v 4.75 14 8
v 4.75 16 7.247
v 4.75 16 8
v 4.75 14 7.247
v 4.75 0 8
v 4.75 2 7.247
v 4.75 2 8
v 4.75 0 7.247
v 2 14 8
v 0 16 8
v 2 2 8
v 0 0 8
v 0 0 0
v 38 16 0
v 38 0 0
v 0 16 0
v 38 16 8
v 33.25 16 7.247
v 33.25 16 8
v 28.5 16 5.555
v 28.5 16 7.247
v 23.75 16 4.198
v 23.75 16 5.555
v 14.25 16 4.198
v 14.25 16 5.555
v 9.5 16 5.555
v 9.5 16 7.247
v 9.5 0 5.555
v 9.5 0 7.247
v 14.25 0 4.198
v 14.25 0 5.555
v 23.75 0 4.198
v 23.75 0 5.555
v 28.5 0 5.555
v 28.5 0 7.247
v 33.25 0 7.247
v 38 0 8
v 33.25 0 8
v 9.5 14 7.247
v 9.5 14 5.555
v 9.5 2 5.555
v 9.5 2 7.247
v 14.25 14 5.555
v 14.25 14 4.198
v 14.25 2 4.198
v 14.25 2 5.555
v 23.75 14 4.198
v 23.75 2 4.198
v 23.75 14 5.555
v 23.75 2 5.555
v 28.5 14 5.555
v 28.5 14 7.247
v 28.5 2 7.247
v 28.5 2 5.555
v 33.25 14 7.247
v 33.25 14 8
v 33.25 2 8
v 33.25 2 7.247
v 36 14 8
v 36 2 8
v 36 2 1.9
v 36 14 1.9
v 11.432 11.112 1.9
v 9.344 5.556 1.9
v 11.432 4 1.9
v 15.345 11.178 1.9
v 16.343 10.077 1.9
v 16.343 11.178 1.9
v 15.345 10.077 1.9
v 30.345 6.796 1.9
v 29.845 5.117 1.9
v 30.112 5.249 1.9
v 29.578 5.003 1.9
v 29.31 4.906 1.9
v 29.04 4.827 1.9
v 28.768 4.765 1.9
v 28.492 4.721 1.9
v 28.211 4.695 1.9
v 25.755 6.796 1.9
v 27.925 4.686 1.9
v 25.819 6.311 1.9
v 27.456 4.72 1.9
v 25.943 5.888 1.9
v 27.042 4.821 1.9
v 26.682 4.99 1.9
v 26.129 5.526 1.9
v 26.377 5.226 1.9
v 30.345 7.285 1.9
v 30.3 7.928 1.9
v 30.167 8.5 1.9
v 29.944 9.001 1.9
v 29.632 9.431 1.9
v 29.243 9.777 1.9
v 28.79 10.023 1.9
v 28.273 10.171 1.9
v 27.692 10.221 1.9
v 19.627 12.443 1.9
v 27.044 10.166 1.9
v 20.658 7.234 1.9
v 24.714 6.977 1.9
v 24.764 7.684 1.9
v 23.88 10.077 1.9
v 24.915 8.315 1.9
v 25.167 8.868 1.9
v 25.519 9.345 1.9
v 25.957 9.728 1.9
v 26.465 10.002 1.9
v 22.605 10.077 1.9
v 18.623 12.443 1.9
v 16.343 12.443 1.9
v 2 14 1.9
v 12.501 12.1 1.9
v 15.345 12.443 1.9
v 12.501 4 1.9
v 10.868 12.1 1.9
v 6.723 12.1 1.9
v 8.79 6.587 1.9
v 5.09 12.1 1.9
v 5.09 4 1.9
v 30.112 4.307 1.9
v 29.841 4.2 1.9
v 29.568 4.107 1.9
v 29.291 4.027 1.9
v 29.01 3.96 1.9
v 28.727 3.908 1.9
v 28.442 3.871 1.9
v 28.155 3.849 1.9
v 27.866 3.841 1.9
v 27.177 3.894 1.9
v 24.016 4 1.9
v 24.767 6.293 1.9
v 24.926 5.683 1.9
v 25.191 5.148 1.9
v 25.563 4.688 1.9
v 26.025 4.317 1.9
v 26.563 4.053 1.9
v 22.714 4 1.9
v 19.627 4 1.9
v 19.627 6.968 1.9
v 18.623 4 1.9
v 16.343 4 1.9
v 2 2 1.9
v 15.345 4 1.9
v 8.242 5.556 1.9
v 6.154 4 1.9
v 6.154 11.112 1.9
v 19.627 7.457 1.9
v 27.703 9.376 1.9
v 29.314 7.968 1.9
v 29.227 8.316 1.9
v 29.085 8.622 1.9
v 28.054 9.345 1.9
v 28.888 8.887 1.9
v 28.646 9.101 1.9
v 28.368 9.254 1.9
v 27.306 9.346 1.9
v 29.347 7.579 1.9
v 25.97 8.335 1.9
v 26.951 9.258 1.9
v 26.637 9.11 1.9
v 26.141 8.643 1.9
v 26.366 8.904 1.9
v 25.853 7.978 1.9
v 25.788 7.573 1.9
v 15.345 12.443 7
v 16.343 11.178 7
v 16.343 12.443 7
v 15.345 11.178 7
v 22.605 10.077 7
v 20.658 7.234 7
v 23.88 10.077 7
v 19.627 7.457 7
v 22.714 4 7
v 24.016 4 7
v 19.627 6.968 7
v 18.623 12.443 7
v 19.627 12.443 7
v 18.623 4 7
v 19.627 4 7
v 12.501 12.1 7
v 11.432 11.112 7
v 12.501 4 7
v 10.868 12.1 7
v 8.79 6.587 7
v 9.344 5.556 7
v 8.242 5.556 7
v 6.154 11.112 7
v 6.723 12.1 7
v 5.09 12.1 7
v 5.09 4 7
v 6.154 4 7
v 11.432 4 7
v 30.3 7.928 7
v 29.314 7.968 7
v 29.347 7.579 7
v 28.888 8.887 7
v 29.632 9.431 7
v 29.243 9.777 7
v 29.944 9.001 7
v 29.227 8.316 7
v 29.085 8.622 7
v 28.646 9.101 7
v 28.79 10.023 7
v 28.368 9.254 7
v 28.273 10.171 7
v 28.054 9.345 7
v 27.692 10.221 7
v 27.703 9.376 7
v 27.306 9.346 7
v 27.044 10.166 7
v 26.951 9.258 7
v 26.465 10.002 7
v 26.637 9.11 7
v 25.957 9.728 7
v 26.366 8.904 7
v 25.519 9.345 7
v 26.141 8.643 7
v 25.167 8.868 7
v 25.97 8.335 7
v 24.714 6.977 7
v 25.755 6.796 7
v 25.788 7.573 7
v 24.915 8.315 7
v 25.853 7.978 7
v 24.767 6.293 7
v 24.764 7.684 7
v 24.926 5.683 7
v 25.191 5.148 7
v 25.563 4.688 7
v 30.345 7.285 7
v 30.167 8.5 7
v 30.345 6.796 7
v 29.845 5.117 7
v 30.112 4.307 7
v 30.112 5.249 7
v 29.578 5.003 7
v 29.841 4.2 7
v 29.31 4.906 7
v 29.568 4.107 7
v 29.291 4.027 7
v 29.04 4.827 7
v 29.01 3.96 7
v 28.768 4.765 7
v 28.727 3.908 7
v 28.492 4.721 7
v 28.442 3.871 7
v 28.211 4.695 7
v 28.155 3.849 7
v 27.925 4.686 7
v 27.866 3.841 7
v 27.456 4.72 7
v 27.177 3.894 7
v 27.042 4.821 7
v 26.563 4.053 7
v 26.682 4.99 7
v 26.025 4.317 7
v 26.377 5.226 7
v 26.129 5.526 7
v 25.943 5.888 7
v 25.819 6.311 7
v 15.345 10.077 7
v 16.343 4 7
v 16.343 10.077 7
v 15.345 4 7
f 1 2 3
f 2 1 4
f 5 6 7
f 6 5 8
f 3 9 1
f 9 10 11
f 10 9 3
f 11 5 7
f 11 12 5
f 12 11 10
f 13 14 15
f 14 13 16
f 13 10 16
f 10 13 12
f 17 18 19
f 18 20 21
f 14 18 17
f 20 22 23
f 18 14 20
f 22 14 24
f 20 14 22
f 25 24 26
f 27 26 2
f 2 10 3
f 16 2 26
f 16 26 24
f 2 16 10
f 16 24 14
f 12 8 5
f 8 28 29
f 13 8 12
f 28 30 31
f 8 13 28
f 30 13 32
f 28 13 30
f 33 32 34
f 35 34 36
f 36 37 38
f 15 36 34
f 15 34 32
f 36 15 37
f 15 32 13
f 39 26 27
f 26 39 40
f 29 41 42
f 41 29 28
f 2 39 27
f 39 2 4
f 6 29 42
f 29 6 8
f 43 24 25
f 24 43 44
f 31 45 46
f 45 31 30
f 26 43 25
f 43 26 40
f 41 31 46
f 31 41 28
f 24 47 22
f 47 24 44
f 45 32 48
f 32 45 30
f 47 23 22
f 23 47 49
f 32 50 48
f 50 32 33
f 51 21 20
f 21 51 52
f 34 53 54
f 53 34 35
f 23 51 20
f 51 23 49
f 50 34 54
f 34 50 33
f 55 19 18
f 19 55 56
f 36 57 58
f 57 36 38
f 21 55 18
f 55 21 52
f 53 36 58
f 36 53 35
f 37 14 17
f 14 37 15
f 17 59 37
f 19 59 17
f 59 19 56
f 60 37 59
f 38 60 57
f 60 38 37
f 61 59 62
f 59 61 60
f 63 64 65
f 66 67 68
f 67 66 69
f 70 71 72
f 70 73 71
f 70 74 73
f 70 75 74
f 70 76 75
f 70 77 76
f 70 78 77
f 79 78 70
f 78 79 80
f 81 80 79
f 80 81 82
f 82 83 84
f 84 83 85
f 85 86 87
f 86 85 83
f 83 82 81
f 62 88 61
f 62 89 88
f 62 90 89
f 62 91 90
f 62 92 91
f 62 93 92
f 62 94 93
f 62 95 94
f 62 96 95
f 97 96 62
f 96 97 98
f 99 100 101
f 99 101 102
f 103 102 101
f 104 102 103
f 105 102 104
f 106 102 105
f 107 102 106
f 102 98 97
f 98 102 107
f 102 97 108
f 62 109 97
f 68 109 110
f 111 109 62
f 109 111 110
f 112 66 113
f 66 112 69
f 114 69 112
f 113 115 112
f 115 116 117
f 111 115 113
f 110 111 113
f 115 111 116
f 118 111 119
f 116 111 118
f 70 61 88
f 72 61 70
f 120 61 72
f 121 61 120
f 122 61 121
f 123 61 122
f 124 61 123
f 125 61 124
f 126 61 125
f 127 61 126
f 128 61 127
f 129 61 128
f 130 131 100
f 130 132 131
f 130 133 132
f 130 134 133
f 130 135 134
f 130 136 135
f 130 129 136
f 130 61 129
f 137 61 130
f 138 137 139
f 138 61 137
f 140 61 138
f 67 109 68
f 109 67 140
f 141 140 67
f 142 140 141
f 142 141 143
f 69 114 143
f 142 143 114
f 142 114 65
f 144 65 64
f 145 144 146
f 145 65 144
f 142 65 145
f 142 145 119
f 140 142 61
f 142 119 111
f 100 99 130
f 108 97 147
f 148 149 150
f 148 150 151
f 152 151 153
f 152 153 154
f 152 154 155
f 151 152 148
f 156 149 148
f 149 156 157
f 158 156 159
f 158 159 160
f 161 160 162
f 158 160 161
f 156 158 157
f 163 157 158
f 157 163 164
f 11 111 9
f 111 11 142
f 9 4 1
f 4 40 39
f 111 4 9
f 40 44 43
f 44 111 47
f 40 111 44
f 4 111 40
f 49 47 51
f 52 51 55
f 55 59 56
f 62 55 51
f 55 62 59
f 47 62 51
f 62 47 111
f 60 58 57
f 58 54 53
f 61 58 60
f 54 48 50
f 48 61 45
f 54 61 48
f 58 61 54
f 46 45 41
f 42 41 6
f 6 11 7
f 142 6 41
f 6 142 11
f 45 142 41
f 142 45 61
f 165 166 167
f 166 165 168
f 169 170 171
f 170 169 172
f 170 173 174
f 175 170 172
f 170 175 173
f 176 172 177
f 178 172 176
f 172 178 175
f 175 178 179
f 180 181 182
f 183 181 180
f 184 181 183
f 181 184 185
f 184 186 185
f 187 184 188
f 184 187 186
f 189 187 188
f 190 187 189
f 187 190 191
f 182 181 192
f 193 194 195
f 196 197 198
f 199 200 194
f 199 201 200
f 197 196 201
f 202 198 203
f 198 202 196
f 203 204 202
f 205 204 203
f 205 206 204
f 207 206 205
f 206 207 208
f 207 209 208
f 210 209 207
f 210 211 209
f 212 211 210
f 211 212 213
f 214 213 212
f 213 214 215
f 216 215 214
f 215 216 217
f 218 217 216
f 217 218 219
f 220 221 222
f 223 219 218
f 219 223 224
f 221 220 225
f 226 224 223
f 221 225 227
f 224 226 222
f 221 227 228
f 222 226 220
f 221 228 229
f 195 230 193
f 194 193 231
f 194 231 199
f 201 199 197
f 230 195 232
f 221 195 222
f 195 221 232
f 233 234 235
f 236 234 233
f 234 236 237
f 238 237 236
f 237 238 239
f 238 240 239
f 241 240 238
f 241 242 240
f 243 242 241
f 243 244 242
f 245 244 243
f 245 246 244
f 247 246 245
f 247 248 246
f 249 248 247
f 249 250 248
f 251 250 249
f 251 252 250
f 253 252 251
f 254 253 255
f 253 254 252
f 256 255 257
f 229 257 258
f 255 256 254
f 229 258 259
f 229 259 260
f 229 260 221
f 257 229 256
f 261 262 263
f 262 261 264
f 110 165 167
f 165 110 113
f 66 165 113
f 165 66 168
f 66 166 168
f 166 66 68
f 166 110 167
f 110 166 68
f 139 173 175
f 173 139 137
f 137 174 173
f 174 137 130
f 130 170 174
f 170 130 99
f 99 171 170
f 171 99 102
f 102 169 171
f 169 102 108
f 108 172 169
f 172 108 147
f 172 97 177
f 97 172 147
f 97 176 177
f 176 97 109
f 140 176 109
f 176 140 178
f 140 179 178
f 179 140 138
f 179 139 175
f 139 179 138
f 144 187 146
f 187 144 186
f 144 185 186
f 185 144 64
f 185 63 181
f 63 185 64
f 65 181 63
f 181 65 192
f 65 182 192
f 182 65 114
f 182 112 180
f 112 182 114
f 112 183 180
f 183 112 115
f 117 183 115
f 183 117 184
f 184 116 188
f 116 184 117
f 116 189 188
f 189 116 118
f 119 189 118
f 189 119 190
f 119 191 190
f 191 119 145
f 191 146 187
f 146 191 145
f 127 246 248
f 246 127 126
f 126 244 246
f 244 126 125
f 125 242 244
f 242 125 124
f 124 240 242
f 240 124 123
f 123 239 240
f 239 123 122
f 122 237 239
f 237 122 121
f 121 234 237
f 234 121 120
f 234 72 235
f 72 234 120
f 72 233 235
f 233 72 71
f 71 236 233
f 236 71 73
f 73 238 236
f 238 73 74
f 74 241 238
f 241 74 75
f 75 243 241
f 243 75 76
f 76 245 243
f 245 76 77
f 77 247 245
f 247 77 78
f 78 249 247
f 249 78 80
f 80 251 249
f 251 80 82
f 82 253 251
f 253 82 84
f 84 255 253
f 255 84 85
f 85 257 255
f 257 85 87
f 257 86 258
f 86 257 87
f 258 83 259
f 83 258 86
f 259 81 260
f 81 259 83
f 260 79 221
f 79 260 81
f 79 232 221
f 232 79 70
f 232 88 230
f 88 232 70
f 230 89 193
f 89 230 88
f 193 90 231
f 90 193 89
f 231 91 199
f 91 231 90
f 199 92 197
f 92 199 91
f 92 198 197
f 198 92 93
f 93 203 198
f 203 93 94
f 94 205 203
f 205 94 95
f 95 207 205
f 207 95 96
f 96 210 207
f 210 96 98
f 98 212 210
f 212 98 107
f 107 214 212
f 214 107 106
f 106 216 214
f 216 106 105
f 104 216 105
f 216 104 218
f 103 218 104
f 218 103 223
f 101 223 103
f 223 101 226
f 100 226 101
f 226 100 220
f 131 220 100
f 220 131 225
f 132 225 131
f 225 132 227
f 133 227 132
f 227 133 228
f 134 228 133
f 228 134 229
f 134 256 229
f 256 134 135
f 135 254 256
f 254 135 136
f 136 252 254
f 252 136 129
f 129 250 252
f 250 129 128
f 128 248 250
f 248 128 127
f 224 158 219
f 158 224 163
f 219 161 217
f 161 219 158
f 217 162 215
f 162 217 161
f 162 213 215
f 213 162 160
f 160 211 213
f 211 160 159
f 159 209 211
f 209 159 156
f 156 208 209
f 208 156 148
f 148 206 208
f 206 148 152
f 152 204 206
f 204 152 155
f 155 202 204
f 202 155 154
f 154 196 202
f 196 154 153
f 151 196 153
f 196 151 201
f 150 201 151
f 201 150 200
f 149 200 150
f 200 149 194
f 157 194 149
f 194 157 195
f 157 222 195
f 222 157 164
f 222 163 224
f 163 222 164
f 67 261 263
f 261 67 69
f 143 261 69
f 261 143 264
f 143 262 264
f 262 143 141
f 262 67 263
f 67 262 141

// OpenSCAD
// MakerBot Handbook Tutorial
// OpenSCAD nametag with parameters
// Modified for Customizer

/////////////////////////////////////////////////////////////////////
// THE PARAMETERS

// preview[view:south, tilt:top]

/* [Text] */

myword = "Mike";
myfont="Black Ops One"; //[Alfa Slab One,Anton,Architects Daughter,Bangers,Black Ops One,Bubblegum Sans,Cherry Cream Soda,Courgette,Damion,Droid Serif,Electrolize,Exo,Fjalla One,Fredoka One,Great Vibes,Josefin Slab,Julius Sans One,Lobster,Luckiest Guy,Marck Script,Montserrat,Nunito,Orbitron,Oswald, Oxygen,Pacifico,Patua One,Passion One,Paytone One,Permanent Marker,Poiret One,Press Start 2P,Quicksand,Righteous,Rock Salt,Rokkitt,Russo One,Satisfy,Shadows Into Light,Sigmar One,Signika,Syncopate,Walter Turncoat]

// size of the letters
fontsize = 8;

// amount the word is extruded
textheight = 7;

// space between characters
myspacing = 1.1;

/* [Dimensions] */

// left to right
length = 38; 

// top to bottom
width = 16;

// to the top of the tallest wave
height = 8;

/* [Wave] */

// number of waves
frequency = 1;

// low is stair-steppy, high is smoother
steps = 8;

// width of the wave border
border = 2;

// distance from border to text
inset = 2;

// thickness of base
base = 2;

/////////////////////////////////////////////////////////////////////
// PRINT THE TEXT

// STEP 3. Translate up and to the right past the border.

translate([ border + inset, border + inset, 0 ]){

    // STEP 2. Pull up the text in the z-direction.
    
    linear_extrude( height = textheight ){
    
        // STEP 1. Write the word in the correct font and size.
        
        text(
            text = myword, 
            font = myfont, 
            size = fontsize, 
            spacing = myspacing
        );
        
    // This closes the parenthesis for "linear_extrude".
    }

// This closes the parenthesis for "translate".  
}

/////////////////////////////////////////////////////////////////////
// THIS TRIGONOMETRIC FUNCTION CONTROLS THE WAVE
// (don't mess with this unless you are a trigonometry master :)

// The first part ensures that the lowest part is above the base.
// The middle part scales the function to a max height of "height".
// The last line is a shifted trig function with variable frequency.
// The "steps-1" allows one extra step contained in the "width".

function f(x) = 
    2*base + 
    0.5*(height - 2*base)*
    ( cos(frequency*x*360/(steps-1)) + 1 );
    
/////////////////////////////////////////////////////////////////////
// MAKE A WAVY SHAPE AND CUT OUT THE INSIDE

// The "difference" command subtracts the second thing from the first.
// We're going to construct a wavy shape and subtract an interior box.

difference(){
    
    // STEP 1: Make a wavy shape out of a series of retangular boxes.
    
    // Make a rectangular box for each number i = 0, 1, ..., steps-1.
    // To get a better idea of what each step is doing,
    // try replacing "steps-1" with something small like "4" or "8".
    // Then make sure it says "[0:steps-1]" again when you're done!
    
    for( i = [0:steps-1] ){
        
        // Move box "i" to the right by "i*(length/steps)" units,
        // so that box "i" begins right where box "i-1" ends.
        // Note that the width of each box is "length/steps".
        
        translate([ i*(length/steps), 0, 0 ])
            
            // This is box "i", a thin rectangular solid.
            // The box height is determined by the function "f".
            // Put a "#" before "cube" to see the full rectangles,
            // and remove it when you're done.
        
            cube([ length/steps, width, f(i) ]);
        
    // This closes the parentheses of the "for" loop.
    }
    
    // STEP 2: Remove a box on the inside to make room for the text.

    // Translate the box past the left and lower borders, and
    // translate it up to just a tiny bit below the top of the base.
    
    translate([ border, border, base-.1 ])
    
        // This is the cube that is to be removed.
        // The length and width take into account the border size.
        // Put a "#" before "cube" to see the box, 
        // and remove it when you're done.
    
        cube([
            length - 2*border,
            width - 2*border,
            height
        ]);
    
 // This closes the parentheses for "difference".
 }

 
 
 
 
 
 
